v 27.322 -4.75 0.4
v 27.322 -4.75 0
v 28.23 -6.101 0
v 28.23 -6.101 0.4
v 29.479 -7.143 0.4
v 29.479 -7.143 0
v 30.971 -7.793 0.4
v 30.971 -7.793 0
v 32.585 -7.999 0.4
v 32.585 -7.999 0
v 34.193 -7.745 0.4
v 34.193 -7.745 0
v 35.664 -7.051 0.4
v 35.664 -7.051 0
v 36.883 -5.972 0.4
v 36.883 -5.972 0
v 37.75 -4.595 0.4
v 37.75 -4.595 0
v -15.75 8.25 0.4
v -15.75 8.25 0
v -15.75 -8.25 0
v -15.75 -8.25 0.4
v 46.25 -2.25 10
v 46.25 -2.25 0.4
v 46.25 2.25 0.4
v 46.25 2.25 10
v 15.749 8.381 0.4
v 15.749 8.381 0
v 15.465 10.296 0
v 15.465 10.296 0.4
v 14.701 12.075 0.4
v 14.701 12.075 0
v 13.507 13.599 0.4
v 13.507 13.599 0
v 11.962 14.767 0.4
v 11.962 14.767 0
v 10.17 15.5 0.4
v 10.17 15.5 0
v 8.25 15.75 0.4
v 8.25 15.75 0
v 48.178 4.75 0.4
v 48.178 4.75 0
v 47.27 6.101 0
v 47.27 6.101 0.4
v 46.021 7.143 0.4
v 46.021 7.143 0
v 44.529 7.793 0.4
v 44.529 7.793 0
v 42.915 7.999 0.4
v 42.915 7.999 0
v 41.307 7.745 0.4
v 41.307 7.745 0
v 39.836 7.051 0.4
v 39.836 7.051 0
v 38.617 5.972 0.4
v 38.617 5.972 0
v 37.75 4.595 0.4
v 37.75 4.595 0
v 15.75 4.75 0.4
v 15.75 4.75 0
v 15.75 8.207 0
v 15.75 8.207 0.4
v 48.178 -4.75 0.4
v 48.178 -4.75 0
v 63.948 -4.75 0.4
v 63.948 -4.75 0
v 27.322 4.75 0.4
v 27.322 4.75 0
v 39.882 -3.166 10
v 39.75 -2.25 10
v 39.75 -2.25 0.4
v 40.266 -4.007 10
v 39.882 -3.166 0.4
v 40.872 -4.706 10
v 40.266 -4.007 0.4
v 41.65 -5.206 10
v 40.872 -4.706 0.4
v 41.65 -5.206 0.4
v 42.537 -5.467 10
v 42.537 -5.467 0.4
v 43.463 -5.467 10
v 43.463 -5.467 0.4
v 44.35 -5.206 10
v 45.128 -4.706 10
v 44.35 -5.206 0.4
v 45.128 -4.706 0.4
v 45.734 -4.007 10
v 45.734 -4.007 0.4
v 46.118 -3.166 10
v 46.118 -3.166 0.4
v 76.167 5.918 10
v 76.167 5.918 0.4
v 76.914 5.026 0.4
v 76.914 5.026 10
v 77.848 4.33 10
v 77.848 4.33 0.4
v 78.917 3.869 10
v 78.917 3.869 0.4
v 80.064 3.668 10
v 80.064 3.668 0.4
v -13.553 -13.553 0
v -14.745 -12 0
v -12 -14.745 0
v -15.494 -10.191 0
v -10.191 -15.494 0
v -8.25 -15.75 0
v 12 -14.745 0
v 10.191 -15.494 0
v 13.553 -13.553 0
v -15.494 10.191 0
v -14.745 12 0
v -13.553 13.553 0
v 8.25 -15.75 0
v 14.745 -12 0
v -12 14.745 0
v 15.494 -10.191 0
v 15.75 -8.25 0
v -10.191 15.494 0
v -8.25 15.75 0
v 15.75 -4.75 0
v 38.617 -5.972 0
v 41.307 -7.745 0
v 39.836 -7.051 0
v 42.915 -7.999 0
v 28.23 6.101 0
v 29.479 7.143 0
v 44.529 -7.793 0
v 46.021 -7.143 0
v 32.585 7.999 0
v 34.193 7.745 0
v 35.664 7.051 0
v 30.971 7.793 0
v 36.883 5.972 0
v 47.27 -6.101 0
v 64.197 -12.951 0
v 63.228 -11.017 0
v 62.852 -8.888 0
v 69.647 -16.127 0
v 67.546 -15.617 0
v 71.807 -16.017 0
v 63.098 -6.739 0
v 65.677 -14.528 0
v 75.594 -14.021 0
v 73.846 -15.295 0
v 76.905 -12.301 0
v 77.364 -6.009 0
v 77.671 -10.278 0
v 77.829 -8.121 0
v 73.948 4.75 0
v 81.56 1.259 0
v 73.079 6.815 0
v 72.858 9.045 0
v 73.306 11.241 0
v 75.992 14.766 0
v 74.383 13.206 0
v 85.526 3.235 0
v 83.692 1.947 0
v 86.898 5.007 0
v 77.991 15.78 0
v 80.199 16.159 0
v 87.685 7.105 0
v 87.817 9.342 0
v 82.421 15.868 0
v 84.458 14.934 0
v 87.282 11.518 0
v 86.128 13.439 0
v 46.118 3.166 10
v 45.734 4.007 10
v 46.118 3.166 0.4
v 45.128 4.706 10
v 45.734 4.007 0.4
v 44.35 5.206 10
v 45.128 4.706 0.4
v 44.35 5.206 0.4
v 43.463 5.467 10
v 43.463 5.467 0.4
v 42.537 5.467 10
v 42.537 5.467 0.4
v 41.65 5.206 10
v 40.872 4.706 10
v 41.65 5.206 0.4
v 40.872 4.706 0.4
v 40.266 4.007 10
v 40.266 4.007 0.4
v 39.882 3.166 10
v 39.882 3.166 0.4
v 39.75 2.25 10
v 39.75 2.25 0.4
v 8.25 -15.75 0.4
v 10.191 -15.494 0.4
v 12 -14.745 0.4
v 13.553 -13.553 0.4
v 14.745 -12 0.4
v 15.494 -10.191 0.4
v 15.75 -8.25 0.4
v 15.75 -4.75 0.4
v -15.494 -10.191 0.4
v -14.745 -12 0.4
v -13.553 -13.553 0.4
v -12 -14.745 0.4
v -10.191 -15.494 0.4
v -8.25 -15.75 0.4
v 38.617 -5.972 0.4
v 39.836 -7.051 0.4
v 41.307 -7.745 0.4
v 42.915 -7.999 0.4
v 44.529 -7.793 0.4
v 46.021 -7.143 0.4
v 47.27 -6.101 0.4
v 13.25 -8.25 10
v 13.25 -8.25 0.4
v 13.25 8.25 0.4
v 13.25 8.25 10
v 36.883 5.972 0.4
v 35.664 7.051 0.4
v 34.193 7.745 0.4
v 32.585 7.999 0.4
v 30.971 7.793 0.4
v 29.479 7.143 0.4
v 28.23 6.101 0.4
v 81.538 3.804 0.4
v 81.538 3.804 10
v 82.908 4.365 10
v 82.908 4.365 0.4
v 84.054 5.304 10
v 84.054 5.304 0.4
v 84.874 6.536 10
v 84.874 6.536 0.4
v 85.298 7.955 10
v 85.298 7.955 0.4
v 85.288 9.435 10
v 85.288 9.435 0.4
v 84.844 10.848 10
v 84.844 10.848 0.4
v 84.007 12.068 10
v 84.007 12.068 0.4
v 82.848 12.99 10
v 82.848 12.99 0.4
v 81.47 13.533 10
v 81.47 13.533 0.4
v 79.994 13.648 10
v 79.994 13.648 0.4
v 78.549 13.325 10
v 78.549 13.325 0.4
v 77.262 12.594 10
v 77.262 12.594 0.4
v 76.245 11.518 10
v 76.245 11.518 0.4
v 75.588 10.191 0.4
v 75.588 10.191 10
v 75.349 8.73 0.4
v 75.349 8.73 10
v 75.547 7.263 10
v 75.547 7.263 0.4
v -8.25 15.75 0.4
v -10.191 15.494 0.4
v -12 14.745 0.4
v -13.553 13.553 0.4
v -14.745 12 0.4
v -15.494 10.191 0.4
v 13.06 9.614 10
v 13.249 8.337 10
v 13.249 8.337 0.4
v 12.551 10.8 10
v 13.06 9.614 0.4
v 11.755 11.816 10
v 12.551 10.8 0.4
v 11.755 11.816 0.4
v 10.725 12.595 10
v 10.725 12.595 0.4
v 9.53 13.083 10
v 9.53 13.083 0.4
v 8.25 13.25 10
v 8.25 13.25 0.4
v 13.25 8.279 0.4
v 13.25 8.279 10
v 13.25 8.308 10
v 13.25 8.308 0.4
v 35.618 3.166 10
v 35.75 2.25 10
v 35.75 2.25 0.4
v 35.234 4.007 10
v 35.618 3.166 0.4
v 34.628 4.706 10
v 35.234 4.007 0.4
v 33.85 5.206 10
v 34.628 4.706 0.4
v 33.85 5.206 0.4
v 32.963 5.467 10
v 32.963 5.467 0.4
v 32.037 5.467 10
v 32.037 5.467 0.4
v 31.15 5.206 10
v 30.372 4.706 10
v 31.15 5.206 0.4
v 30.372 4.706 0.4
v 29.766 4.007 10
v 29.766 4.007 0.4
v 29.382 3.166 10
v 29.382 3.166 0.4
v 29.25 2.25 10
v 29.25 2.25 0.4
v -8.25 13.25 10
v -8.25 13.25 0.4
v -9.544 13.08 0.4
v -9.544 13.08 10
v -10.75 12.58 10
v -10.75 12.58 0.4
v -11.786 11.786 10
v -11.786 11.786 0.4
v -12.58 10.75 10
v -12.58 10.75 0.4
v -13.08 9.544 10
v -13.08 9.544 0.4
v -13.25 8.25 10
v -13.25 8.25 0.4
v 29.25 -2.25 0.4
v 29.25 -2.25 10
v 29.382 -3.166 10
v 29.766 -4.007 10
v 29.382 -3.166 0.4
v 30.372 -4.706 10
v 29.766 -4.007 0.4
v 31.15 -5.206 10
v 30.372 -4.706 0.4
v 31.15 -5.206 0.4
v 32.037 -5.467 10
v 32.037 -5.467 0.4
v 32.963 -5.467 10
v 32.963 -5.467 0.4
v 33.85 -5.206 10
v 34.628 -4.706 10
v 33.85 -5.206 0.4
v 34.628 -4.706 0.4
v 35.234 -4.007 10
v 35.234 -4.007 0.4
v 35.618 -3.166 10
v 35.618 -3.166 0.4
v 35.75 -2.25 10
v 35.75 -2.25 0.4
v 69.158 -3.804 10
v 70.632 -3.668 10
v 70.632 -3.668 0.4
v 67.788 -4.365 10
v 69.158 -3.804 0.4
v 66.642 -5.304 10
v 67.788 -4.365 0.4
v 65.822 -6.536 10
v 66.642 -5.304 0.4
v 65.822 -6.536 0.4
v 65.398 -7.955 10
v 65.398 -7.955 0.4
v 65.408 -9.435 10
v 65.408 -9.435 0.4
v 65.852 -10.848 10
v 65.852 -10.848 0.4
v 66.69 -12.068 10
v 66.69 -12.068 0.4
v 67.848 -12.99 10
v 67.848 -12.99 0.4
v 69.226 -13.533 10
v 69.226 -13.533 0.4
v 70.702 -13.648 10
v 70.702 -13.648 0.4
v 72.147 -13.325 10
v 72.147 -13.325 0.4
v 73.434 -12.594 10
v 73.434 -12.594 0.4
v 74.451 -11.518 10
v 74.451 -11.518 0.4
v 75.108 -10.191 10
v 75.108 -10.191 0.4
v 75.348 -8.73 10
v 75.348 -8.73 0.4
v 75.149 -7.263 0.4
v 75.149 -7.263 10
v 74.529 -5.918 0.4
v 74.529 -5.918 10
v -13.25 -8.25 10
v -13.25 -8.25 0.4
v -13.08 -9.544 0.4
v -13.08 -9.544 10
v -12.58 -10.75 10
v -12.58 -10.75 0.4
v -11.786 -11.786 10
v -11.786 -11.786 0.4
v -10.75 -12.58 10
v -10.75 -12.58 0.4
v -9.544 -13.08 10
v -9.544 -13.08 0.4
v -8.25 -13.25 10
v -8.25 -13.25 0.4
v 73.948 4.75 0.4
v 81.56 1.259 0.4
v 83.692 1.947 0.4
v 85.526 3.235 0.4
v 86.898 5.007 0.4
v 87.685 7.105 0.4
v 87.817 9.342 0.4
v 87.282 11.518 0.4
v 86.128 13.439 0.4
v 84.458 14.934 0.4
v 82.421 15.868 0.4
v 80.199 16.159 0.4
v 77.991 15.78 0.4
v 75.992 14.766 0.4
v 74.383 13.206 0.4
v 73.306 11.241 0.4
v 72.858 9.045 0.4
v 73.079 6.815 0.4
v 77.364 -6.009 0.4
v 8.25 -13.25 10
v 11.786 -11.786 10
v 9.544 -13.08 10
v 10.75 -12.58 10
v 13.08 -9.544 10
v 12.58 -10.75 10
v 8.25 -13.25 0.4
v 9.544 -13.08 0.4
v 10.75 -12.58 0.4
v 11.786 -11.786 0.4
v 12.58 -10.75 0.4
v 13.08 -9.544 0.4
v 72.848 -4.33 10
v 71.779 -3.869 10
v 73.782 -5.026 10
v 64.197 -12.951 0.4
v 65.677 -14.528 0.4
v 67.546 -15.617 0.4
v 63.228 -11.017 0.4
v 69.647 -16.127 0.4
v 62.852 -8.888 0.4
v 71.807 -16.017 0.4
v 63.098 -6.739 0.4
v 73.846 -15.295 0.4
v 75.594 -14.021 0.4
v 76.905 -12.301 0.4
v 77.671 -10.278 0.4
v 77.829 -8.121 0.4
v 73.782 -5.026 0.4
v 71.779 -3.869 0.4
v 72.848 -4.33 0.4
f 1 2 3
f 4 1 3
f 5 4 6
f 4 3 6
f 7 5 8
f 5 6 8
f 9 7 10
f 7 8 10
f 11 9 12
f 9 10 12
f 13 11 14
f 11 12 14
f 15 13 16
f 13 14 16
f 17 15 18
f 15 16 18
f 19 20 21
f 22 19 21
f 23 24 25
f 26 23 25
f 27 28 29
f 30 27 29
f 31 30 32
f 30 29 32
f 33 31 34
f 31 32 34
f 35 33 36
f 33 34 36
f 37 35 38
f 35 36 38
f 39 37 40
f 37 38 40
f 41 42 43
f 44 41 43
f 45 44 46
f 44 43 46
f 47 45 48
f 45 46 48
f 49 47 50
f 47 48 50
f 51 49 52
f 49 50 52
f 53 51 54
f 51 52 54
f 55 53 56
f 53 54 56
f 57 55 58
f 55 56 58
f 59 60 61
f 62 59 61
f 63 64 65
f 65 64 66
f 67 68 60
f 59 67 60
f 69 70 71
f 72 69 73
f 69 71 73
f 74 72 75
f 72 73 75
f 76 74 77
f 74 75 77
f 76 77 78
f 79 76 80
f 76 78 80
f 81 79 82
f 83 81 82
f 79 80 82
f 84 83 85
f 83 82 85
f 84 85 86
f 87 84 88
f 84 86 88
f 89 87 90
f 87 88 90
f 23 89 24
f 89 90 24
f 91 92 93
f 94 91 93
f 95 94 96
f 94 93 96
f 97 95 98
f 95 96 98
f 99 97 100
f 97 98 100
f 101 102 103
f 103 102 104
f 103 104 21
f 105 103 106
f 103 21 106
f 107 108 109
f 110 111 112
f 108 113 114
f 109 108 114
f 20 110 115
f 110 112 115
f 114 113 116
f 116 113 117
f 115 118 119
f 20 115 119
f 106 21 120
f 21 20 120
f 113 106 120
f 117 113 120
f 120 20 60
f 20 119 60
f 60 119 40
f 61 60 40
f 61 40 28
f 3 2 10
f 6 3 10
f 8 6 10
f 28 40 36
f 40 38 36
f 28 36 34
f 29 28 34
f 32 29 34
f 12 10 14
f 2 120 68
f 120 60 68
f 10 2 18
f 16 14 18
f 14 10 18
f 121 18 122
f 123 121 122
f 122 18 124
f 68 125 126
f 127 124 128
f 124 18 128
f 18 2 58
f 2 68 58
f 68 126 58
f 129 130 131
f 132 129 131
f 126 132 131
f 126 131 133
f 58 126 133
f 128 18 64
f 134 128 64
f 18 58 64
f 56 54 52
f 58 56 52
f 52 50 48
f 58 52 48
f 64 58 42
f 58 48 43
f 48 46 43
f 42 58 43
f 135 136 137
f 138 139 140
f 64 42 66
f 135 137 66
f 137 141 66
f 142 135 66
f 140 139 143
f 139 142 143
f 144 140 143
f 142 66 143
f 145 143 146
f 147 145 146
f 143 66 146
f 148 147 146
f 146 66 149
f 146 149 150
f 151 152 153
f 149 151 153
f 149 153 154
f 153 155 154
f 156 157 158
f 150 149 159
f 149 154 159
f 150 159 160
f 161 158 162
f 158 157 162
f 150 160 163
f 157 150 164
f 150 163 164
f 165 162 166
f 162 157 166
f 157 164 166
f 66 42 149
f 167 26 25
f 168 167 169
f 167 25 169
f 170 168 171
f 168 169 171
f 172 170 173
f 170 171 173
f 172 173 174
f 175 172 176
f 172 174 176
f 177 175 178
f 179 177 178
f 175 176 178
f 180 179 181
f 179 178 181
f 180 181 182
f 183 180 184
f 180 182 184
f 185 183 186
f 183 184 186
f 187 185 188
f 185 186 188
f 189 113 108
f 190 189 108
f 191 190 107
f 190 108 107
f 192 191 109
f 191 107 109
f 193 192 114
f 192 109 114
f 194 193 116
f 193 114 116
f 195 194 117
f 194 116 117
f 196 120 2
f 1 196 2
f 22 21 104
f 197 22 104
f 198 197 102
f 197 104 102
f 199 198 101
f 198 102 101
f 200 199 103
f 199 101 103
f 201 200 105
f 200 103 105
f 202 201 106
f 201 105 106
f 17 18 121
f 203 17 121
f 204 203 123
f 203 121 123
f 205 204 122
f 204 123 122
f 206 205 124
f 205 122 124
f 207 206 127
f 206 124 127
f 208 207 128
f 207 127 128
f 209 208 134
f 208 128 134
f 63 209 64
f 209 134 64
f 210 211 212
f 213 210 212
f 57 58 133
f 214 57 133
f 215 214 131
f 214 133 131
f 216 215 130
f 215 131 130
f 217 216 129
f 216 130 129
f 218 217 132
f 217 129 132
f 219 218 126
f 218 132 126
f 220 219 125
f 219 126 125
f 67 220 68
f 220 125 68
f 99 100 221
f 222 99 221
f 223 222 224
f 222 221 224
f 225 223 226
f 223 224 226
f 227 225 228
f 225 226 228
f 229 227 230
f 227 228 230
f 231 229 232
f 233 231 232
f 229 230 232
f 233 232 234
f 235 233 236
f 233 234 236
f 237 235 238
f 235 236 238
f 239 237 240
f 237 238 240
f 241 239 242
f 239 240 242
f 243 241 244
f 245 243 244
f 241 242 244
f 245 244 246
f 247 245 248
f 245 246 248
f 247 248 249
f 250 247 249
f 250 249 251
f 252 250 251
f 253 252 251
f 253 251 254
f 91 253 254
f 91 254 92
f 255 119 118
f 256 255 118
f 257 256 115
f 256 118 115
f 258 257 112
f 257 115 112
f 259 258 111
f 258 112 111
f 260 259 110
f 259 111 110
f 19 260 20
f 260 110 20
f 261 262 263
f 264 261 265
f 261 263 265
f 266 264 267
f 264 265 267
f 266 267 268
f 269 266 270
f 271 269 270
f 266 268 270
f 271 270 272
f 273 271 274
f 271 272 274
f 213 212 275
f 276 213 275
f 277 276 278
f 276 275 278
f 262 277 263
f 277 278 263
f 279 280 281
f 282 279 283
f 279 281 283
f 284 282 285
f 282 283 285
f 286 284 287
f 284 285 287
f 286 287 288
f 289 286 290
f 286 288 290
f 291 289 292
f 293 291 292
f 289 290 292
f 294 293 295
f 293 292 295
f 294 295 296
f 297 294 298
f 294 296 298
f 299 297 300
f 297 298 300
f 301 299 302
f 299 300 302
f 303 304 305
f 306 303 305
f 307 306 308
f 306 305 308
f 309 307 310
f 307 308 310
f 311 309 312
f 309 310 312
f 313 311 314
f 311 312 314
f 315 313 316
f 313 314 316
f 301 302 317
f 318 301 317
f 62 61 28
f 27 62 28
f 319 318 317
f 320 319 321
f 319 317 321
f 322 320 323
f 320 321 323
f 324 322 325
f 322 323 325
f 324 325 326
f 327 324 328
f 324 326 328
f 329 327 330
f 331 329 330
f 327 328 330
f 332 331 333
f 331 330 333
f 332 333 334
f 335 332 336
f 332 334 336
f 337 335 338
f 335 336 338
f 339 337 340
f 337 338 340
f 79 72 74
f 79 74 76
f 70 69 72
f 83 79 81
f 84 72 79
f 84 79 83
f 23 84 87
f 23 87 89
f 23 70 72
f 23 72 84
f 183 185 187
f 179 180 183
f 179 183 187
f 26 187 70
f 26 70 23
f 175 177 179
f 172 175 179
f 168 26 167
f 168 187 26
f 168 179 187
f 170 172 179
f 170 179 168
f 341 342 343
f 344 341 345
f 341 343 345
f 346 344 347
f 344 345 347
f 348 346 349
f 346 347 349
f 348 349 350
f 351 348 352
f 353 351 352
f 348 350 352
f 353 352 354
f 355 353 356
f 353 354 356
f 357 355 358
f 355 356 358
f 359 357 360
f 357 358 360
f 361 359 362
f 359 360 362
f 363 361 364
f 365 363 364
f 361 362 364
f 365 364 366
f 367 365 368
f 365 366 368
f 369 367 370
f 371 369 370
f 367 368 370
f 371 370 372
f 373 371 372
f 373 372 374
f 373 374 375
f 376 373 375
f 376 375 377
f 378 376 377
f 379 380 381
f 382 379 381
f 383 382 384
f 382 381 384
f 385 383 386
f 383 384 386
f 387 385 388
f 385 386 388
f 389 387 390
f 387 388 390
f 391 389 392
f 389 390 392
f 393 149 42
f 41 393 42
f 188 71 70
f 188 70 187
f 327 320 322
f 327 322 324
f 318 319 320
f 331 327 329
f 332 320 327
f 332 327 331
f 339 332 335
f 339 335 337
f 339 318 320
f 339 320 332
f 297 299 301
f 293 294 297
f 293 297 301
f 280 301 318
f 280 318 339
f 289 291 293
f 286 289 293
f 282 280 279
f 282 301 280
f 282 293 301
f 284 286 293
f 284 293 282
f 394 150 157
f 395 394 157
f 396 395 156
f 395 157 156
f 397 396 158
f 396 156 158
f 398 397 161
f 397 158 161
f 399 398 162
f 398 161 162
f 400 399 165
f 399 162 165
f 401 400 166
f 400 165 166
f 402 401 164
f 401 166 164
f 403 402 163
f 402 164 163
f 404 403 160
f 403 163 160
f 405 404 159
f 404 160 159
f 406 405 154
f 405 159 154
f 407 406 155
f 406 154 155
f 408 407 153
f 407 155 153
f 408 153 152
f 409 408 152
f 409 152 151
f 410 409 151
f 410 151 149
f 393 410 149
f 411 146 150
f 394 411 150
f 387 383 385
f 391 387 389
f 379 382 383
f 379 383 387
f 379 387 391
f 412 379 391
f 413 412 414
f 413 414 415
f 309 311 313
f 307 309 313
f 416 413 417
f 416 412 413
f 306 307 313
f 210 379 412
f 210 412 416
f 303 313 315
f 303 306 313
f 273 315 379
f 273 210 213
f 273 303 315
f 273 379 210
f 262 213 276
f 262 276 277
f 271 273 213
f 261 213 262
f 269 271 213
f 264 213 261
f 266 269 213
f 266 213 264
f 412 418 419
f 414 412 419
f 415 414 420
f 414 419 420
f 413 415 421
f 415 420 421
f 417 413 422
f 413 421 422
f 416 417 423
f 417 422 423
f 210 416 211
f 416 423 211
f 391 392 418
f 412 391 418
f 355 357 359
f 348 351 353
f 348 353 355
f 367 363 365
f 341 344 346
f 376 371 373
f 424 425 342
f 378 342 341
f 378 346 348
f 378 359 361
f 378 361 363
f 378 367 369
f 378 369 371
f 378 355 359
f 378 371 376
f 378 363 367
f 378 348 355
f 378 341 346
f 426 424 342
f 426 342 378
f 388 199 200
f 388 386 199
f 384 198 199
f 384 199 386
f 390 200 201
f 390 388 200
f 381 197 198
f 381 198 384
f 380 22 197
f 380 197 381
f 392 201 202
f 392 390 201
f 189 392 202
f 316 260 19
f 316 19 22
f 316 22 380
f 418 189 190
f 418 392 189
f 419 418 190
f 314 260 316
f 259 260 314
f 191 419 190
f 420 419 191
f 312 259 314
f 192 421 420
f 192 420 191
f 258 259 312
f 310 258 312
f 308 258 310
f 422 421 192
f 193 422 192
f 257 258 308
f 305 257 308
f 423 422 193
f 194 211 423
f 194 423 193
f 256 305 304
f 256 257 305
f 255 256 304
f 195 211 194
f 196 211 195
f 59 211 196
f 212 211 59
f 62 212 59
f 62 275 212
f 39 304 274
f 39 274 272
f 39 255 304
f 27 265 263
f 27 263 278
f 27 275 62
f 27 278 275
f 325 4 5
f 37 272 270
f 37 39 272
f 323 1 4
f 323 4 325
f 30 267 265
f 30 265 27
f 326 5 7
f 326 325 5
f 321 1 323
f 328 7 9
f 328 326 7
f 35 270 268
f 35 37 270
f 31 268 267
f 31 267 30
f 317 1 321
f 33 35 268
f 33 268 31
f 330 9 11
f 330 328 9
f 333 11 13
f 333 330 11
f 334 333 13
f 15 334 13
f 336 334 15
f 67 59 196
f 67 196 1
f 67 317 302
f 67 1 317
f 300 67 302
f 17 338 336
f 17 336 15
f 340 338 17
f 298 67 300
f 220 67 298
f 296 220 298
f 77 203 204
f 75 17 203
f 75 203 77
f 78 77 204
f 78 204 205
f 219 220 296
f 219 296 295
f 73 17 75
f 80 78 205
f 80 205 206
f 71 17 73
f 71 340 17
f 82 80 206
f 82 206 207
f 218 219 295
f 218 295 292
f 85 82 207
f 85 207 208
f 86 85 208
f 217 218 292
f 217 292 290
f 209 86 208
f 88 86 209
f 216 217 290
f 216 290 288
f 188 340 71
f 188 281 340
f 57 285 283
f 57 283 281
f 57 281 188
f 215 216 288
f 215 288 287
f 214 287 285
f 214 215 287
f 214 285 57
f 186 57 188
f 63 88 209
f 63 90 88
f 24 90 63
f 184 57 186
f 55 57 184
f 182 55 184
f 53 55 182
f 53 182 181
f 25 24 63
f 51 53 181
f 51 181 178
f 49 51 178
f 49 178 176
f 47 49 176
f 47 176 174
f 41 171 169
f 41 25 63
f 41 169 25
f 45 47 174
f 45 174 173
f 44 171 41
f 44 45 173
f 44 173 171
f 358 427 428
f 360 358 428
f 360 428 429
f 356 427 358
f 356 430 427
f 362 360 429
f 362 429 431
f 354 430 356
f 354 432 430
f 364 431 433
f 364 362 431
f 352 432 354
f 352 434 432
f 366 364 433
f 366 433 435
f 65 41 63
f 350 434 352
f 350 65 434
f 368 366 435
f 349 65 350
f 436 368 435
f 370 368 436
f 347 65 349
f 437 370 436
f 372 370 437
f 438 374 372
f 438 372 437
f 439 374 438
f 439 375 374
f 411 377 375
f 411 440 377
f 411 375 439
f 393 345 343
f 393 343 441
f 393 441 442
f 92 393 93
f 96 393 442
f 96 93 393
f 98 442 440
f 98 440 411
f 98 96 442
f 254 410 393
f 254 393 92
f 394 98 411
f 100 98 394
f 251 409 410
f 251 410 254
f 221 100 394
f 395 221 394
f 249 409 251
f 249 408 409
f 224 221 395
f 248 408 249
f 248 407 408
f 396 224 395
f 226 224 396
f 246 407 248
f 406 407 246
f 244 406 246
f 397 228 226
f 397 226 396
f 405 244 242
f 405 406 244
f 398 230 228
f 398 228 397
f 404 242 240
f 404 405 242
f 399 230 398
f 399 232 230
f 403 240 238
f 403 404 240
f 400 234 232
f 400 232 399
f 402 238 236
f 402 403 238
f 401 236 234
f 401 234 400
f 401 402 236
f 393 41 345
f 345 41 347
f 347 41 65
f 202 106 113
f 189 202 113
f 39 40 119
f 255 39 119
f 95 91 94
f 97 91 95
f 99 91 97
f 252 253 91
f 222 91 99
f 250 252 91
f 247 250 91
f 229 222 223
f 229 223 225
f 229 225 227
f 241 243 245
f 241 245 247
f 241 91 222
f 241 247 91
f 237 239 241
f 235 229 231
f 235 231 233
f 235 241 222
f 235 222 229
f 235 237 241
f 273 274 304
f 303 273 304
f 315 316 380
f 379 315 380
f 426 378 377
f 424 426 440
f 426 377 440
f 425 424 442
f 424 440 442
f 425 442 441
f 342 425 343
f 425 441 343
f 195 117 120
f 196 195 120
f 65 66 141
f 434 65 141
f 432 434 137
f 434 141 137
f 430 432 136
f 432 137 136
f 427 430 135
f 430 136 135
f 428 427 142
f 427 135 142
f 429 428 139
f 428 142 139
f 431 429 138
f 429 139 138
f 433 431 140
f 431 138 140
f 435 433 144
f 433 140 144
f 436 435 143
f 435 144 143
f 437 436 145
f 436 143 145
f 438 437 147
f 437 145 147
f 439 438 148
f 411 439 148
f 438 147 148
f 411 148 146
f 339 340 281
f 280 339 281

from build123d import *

# Parameters (mm, degrees)
F0_W     = 6.5
F0_H     = 4.5
F0_W_2   = 4
F1_DEPTH = 0.4
F2_DEPTH = 10


with BuildPart() as f1:
    # F0 (on Top) → F1 (new body)
    with BuildSketch(Plane.XY):
        with BuildLine():
            Line((8.25, 15.75), (-8.25, 15.75))
            ThreePointArc((-8.25, 15.75), (-13.5533008589, 13.5533008589), (-15.75, 8.25))
            Line((-15.75, 8.25), (-15.75, -8.25))
            ThreePointArc((-15.75, -8.25), (-13.5533008589, -13.5533008589), (-8.25, -15.75))
            Line((-8.25, -15.75), (8.25, -15.75))
            ThreePointArc((8.25, -15.75), (13.5533008589, -13.5533008589), (15.75, -8.25))
            Line((15.75, -8.25), (15.75, -4.75))
            Line((15.75, -4.75), (27.3219212057, -4.75))
            ThreePointArc((27.3219212057, -4.75), (32.5853423404, -7.9993666334), (37.75, -4.5952078799))
            ThreePointArc((37.75, -4.5952078799), (42.9146576596, -7.9993666334), (48.1780787943, -4.75))
            Line((48.1780787943, -4.75), (63.9480829801, -4.75))
            ThreePointArc((63.9480829801, -4.75), (69.6474451199, -16.1274567319), (77.3637435709, -6.0087617221))
            Line((77.3637435709, -6.0087617221), (81.5596501878, 1.2587617221))
            ThreePointArc((81.5596501878, 1.2587617221), (83.4749132345, 15.4773568118), (73.9480829801, 4.75))
            Line((73.9480829801, 4.75), (48.1780787943, 4.75))
            ThreePointArc((48.1780787943, 4.75), (42.9146576596, 7.9993666334), (37.75, 4.5952078799))
            ThreePointArc((37.75, 4.5952078799), (32.5853423404, 7.9993666334), (27.3219212057, 4.75))
            Line((27.3219212057, 4.75), (15.75, 4.75))
            Line((15.75, 4.75), (15.75, 8.2067806795))
            Line((15.75, 8.2067806795), (15.7488597394, 8.3807769432))
            ThreePointArc((15.7488597394, 8.3807769432), (13.5068608944, 13.5993376728), (8.25, 15.75))
        make_face()
        with BuildLine():
            ThreePointArc((-13.25, 8.25), (-11.7855339059, 11.7855339059), (-8.25, 13.25))
            Line((-8.25, 13.25), (-4.5, 13.25))
            Line((-4.5, 13.25), (4.5, 13.25))
            Line((4.5, 13.25), (8.25, 13.25))
            ThreePointArc((8.25, 13.25), (11.7545739296, 11.8162251152), (13.2492398263, 8.3371846288))
            ThreePointArc((13.2492398263, 8.3371846288), (13.249809953, 8.2935939714), (13.25, 8.25))
            Line((13.25, 8.25), (13.25, 8.2446288243))
            Line((13.25, 8.2446288243), (13.25, 8.2392576486))
            Line((13.25, 8.2392576486), (13.25, 8.2285152972))
            Line((13.25, 8.2285152972), (13.25, 8.2070305943))
            Line((13.25, 8.2070305943), (13.25, 4.5))
            Line((13.25, 4.5), (13.25, 2.25))
            Line((13.25, 2.25), (29.25, 2.25))
            ThreePointArc((29.25, 2.25), (32.5, 5.5), (35.75, 2.25))
            Line((35.75, 2.25), (39.75, 2.25))
            ThreePointArc((39.75, 2.25), (43, 5.5), (46.25, 2.25))
            Line((46.25, 2.25), (72.75, 2.25))
            Line((72.75, 2.25), (74.0490381057, 2.25))
            Line((74.0490381057, 2.25), (76.1669476654, 5.9183269633))
            ThreePointArc((76.1669476654, 5.9183269633), (82.8480762114, 12.9903810568), (80.0640619824, 3.6683269633))
            Line((80.0640619824, 3.6683269633), (74.5292047573, -5.9183269633))
            ThreePointArc((74.5292047573, -5.9183269633), (67.8480762114, -12.9903810568), (70.6320904403, -3.6683269633))
            Line((70.6320904403, -3.6683269633), (71.4509618943, -2.25))
            Line((71.4509618943, -2.25), (46.25, -2.25))
            ThreePointArc((46.25, -2.25), (43, -5.5), (39.75, -2.25))
            Line((39.75, -2.25), (35.75, -2.25))
            ThreePointArc((35.75, -2.25), (32.5, -5.5), (29.25, -2.25))
            Line((29.25, -2.25), (13.25, -2.25))
            Line((13.25, -2.25), (13.25, -4.5))
            Line((13.25, -4.5), (13.25, -8.25))
            ThreePointArc((13.25, -8.25), (11.7855339059, -11.7855339059), (8.25, -13.25))
            Line((8.25, -13.25), (4.5, -13.25))
            Line((4.5, -13.25), (-4.5, -13.25))
            Line((-4.5, -13.25), (-8.25, -13.25))
            ThreePointArc((-8.25, -13.25), (-11.7855339059, -11.7855339059), (-13.25, -8.25))
            Line((-13.25, -8.25), (-13.25, -4.5))
            Line((-13.25, -4.5), (-13.25, 4.5))
            Line((-13.25, 4.5), (-13.25, 8.25))
        make_face(mode=Mode.SUBTRACT)
        Polygon((72.75, 2.25), (46.25, 2.25), (46.25, -2.25), (71.4509618943, -2.25), (74.0490381057, 2.25), align=None)
        Polygon((4.5, 13.25), (-4.5, 13.25), (-4.5, 4.5), (0, 4.5), (4.5, 4.5), align=None)
        Polygon((4.5, -4.5), (0, -4.5), (-4.5, -4.5), (-4.5, -13.25), (4.5, -13.25), align=None)
        Polygon((-4.5, 0), (-4.5, 4.5), (-13.25, 4.5), (-13.25, -4.5), (-4.5, -4.5), align=None)
        Polygon((13.25, 4.5), (4.5, 4.5), (4.5, 0), (4.5, -4.5), (13.25, -4.5), (13.25, -2.25), (13.25, 0), (13.25, 2.25), align=None)
        with BuildLine():
            ThreePointArc((74.5292047573, -5.9183269633), (72.8480762114, -4.3301270189), (70.6320904403, -3.6683269633))
            ThreePointArc((70.6320904403, -3.6683269633), (67.8480762114, -12.9903810568), (74.5292047573, -5.9183269633))
        make_face()
        with BuildLine():
            ThreePointArc((80.0640619824, 3.6683269633), (82.8480762114, 12.9903810568), (76.1669476654, 5.9183269633))
            ThreePointArc((76.1669476654, 5.9183269633), (77.8480762114, 4.3301270189), (80.0640619824, 3.6683269633))
        make_face()
        Polygon((29.25, 2.25), (13.25, 2.25), (13.25, 0), (13.25, -2.25), (29.25, -2.25), (29.25, 0), align=None)
        with BuildLine():
            Line((-4.5, 13.25), (-8.25, 13.25))
            ThreePointArc((-8.25, 13.25), (-11.7855339059, 11.7855339059), (-13.25, 8.25))
            Line((-13.25, 8.25), (-13.25, 4.5))
            Line((-13.25, 4.5), (-4.5, 4.5))
            Line((-4.5, 4.5), (-4.5, 13.25))
        make_face()
        with BuildLine():
            Line((8.25, 13.25), (4.5, 13.25))
            Line((4.5, 13.25), (4.5, 4.5))
            Line((4.5, 4.5), (13.25, 4.5))
            Line((13.25, 4.5), (13.25, 8.2070305943))
            Line((13.25, 8.2070305943), (13.25, 8.2285152972))
            Line((13.25, 8.2285152972), (13.25, 8.2392576486))
            Line((13.25, 8.2392576486), (13.25, 8.2446288243))
            Line((13.25, 8.2446288243), (13.25, 8.25))
            ThreePointArc((13.25, 8.25), (13.249809953, 8.2935939714), (13.2492398263, 8.3371846288))
            ThreePointArc((13.2492398263, 8.3371846288), (11.7545739296, 11.8162251152), (8.25, 13.25))
        make_face()
        with BuildLine():
            Line((-4.5, -4.5), (-13.25, -4.5))
            Line((-13.25, -4.5), (-13.25, -8.25))
            ThreePointArc((-13.25, -8.25), (-11.7855339059, -11.7855339059), (-8.25, -13.25))
            Line((-8.25, -13.25), (-4.5, -13.25))
            Line((-4.5, -13.25), (-4.5, -4.5))
        make_face()
        with BuildLine():
            Line((13.25, -4.5), (4.5, -4.5))
            Line((4.5, -4.5), (4.5, -13.25))
            Line((4.5, -13.25), (8.25, -13.25))
            ThreePointArc((8.25, -13.25), (11.7855339059, -11.7855339059), (13.25, -8.25))
            Line((13.25, -8.25), (13.25, -4.5))
        make_face()
        with BuildLine():
            ThreePointArc((0, 4.5), (-3.1819805153, 3.1819805153), (-4.5, 0))
            ThreePointArc((-4.5, 0), (-3.1819805153, -3.1819805153), (0, -4.5))
            ThreePointArc((0, -4.5), (3.1819805153, -3.1819805153), (4.5, 0))
            ThreePointArc((4.5, 0), (3.1819805153, 3.1819805153), (0, 4.5))
        make_face()
        with BuildLine():
            Line((74.0490381057, 2.25), (71.4509618943, -2.25))
            Line((71.4509618943, -2.25), (70.6320904403, -3.6683269633))
            ThreePointArc((70.6320904403, -3.6683269633), (72.8480762114, -4.3301270189), (74.5292047573, -5.9183269633))
            Line((74.5292047573, -5.9183269633), (80.0640619824, 3.6683269633))
            ThreePointArc((80.0640619824, 3.6683269633), (77.8480762114, 4.3301270189), (76.1669476654, 5.9183269633))
            Line((76.1669476654, 5.9183269633), (74.0490381057, 2.25))
        make_face()
        with Locations((43, 0)):
            Rectangle(F0_W, F0_H)
        Polygon((35.75, 2.25), (29.25, 2.25), (29.25, 0), (29.25, -2.25), (35.75, -2.25), align=None)
        with Locations((37.75, 0)):
            Rectangle(F0_W_2, F0_H)
        with BuildLine():
            ThreePointArc((35.75, 2.25), (32.5, 5.5), (29.25, 2.25))
            Line((29.25, 2.25), (35.75, 2.25))
        make_face()
        with BuildLine():
            Line((35.75, -2.25), (29.25, -2.25))
            ThreePointArc((29.25, -2.25), (32.5, -5.5), (35.75, -2.25))
        make_face()
        with BuildLine():
            Line((46.25, -2.25), (39.75, -2.25))
            ThreePointArc((39.75, -2.25), (43, -5.5), (46.25, -2.25))
        make_face()
        with BuildLine():
            ThreePointArc((46.25, 2.25), (43, 5.5), (39.75, 2.25))
            Line((39.75, 2.25), (46.25, 2.25))
        make_face()
        with BuildLine():
            ThreePointArc((0, -4.5), (-3.1819805153, -3.1819805153), (-4.5, 0))
            Line((-4.5, 0), (-4.5, -4.5))
            Line((-4.5, -4.5), (0, -4.5))
        make_face()
        with BuildLine():
            Line((0, 4.5), (-4.5, 4.5))
            Line((-4.5, 4.5), (-4.5, 0))
            ThreePointArc((-4.5, 0), (-3.1819805153, 3.1819805153), (0, 4.5))
        make_face()
        with BuildLine():
            Line((4.5, -4.5), (4.5, 0))
            ThreePointArc((4.5, 0), (3.1819805153, -3.1819805153), (0, -4.5))
            Line((0, -4.5), (4.5, -4.5))
        make_face()
        with BuildLine():
            Line((4.5, 0), (4.5, 4.5))
            Line((4.5, 4.5), (0, 4.5))
            ThreePointArc((0, 4.5), (3.1819805153, 3.1819805153), (4.5, 0))
        make_face()
    extrude(amount=F1_DEPTH)

    # F0 (on Top) → F2 (join)
    with BuildSketch(Plane.XY):
        with BuildLine():
            Line((-4.5, 13.25), (-8.25, 13.25))
            ThreePointArc((-8.25, 13.25), (-11.7855339059, 11.7855339059), (-13.25, 8.25))
            Line((-13.25, 8.25), (-13.25, 4.5))
            Line((-13.25, 4.5), (-4.5, 4.5))
            Line((-4.5, 4.5), (-4.5, 13.25))
        make_face()
        Polygon((4.5, 13.25), (-4.5, 13.25), (-4.5, 4.5), (0, 4.5), (4.5, 4.5), align=None)
        with BuildLine():
            Line((8.25, 13.25), (4.5, 13.25))
            Line((4.5, 13.25), (4.5, 4.5))
            Line((4.5, 4.5), (13.25, 4.5))
            Line((13.25, 4.5), (13.25, 8.2070305943))
            Line((13.25, 8.2070305943), (13.25, 8.2285152972))
            Line((13.25, 8.2285152972), (13.25, 8.2392576486))
            Line((13.25, 8.2392576486), (13.25, 8.2446288243))
            Line((13.25, 8.2446288243), (13.25, 8.25))
            ThreePointArc((13.25, 8.25), (13.249809953, 8.2935939714), (13.2492398263, 8.3371846288))
            ThreePointArc((13.2492398263, 8.3371846288), (11.7545739296, 11.8162251152), (8.25, 13.25))
        make_face()
        with BuildLine():
            Line((0, 4.5), (-4.5, 4.5))
            Line((-4.5, 4.5), (-4.5, 0))
            ThreePointArc((-4.5, 0), (-3.1819805153, 3.1819805153), (0, 4.5))
        make_face()
        Polygon((-4.5, 0), (-4.5, 4.5), (-13.25, 4.5), (-13.25, -4.5), (-4.5, -4.5), align=None)
        Polygon((13.25, 4.5), (4.5, 4.5), (4.5, 0), (4.5, -4.5), (13.25, -4.5), (13.25, -2.25), (13.25, 0), (13.25, 2.25), align=None)
        with BuildLine():
            Line((4.5, 0), (4.5, 4.5))
            Line((4.5, 4.5), (0, 4.5))
            ThreePointArc((0, 4.5), (3.1819805153, 3.1819805153), (4.5, 0))
        make_face()
        with BuildLine():
            ThreePointArc((0, 4.5), (-3.1819805153, 3.1819805153), (-4.5, 0))
            ThreePointArc((-4.5, 0), (-3.1819805153, -3.1819805153), (0, -4.5))
            ThreePointArc((0, -4.5), (3.1819805153, -3.1819805153), (4.5, 0))
            ThreePointArc((4.5, 0), (3.1819805153, 3.1819805153), (0, 4.5))
        make_face()
        with BuildLine():
            ThreePointArc((0, -4.5), (-3.1819805153, -3.1819805153), (-4.5, 0))
            Line((-4.5, 0), (-4.5, -4.5))
            Line((-4.5, -4.5), (0, -4.5))
        make_face()
        with BuildLine():
            Line((-4.5, -4.5), (-13.25, -4.5))
            Line((-13.25, -4.5), (-13.25, -8.25))
            ThreePointArc((-13.25, -8.25), (-11.7855339059, -11.7855339059), (-8.25, -13.25))
            Line((-8.25, -13.25), (-4.5, -13.25))
            Line((-4.5, -13.25), (-4.5, -4.5))
        make_face()
        with BuildLine():
            Line((4.5, -4.5), (4.5, 0))
            ThreePointArc((4.5, 0), (3.1819805153, -3.1819805153), (0, -4.5))
            Line((0, -4.5), (4.5, -4.5))
        make_face()
        Polygon((4.5, -4.5), (0, -4.5), (-4.5, -4.5), (-4.5, -13.25), (4.5, -13.25), align=None)
        with BuildLine():
            Line((13.25, -4.5), (4.5, -4.5))
            Line((4.5, -4.5), (4.5, -13.25))
            Line((4.5, -13.25), (8.25, -13.25))
            ThreePointArc((8.25, -13.25), (11.7855339059, -11.7855339059), (13.25, -8.25))
            Line((13.25, -8.25), (13.25, -4.5))
        make_face()
        Polygon((35.75, 2.25), (29.25, 2.25), (29.25, 0), (29.25, -2.25), (35.75, -2.25), align=None)
        with BuildLine():
            ThreePointArc((35.75, 2.25), (32.5, 5.5), (29.25, 2.25))
            Line((29.25, 2.25), (35.75, 2.25))
        make_face()
        with BuildLine():
            Line((35.75, -2.25), (29.25, -2.25))
            ThreePointArc((29.25, -2.25), (32.5, -5.5), (35.75, -2.25))
        make_face()
        with Locations((43, 0)):
            Rectangle(F0_W, F0_H)
        with BuildLine():
            ThreePointArc((46.25, 2.25), (43, 5.5), (39.75, 2.25))
            Line((39.75, 2.25), (46.25, 2.25))
        make_face()
        with BuildLine():
            Line((46.25, -2.25), (39.75, -2.25))
            ThreePointArc((39.75, -2.25), (43, -5.5), (46.25, -2.25))
        make_face()
        with BuildLine():
            ThreePointArc((74.5292047573, -5.9183269633), (72.8480762114, -4.3301270189), (70.6320904403, -3.6683269633))
            ThreePointArc((70.6320904403, -3.6683269633), (67.8480762114, -12.9903810568), (74.5292047573, -5.9183269633))
        make_face()
        with BuildLine():
            ThreePointArc((80.0640619824, 3.6683269633), (82.8480762114, 12.9903810568), (76.1669476654, 5.9183269633))
            ThreePointArc((76.1669476654, 5.9183269633), (77.8480762114, 4.3301270189), (80.0640619824, 3.6683269633))
        make_face()
    extrude(amount=F2_DEPTH)


solid = f1.part
